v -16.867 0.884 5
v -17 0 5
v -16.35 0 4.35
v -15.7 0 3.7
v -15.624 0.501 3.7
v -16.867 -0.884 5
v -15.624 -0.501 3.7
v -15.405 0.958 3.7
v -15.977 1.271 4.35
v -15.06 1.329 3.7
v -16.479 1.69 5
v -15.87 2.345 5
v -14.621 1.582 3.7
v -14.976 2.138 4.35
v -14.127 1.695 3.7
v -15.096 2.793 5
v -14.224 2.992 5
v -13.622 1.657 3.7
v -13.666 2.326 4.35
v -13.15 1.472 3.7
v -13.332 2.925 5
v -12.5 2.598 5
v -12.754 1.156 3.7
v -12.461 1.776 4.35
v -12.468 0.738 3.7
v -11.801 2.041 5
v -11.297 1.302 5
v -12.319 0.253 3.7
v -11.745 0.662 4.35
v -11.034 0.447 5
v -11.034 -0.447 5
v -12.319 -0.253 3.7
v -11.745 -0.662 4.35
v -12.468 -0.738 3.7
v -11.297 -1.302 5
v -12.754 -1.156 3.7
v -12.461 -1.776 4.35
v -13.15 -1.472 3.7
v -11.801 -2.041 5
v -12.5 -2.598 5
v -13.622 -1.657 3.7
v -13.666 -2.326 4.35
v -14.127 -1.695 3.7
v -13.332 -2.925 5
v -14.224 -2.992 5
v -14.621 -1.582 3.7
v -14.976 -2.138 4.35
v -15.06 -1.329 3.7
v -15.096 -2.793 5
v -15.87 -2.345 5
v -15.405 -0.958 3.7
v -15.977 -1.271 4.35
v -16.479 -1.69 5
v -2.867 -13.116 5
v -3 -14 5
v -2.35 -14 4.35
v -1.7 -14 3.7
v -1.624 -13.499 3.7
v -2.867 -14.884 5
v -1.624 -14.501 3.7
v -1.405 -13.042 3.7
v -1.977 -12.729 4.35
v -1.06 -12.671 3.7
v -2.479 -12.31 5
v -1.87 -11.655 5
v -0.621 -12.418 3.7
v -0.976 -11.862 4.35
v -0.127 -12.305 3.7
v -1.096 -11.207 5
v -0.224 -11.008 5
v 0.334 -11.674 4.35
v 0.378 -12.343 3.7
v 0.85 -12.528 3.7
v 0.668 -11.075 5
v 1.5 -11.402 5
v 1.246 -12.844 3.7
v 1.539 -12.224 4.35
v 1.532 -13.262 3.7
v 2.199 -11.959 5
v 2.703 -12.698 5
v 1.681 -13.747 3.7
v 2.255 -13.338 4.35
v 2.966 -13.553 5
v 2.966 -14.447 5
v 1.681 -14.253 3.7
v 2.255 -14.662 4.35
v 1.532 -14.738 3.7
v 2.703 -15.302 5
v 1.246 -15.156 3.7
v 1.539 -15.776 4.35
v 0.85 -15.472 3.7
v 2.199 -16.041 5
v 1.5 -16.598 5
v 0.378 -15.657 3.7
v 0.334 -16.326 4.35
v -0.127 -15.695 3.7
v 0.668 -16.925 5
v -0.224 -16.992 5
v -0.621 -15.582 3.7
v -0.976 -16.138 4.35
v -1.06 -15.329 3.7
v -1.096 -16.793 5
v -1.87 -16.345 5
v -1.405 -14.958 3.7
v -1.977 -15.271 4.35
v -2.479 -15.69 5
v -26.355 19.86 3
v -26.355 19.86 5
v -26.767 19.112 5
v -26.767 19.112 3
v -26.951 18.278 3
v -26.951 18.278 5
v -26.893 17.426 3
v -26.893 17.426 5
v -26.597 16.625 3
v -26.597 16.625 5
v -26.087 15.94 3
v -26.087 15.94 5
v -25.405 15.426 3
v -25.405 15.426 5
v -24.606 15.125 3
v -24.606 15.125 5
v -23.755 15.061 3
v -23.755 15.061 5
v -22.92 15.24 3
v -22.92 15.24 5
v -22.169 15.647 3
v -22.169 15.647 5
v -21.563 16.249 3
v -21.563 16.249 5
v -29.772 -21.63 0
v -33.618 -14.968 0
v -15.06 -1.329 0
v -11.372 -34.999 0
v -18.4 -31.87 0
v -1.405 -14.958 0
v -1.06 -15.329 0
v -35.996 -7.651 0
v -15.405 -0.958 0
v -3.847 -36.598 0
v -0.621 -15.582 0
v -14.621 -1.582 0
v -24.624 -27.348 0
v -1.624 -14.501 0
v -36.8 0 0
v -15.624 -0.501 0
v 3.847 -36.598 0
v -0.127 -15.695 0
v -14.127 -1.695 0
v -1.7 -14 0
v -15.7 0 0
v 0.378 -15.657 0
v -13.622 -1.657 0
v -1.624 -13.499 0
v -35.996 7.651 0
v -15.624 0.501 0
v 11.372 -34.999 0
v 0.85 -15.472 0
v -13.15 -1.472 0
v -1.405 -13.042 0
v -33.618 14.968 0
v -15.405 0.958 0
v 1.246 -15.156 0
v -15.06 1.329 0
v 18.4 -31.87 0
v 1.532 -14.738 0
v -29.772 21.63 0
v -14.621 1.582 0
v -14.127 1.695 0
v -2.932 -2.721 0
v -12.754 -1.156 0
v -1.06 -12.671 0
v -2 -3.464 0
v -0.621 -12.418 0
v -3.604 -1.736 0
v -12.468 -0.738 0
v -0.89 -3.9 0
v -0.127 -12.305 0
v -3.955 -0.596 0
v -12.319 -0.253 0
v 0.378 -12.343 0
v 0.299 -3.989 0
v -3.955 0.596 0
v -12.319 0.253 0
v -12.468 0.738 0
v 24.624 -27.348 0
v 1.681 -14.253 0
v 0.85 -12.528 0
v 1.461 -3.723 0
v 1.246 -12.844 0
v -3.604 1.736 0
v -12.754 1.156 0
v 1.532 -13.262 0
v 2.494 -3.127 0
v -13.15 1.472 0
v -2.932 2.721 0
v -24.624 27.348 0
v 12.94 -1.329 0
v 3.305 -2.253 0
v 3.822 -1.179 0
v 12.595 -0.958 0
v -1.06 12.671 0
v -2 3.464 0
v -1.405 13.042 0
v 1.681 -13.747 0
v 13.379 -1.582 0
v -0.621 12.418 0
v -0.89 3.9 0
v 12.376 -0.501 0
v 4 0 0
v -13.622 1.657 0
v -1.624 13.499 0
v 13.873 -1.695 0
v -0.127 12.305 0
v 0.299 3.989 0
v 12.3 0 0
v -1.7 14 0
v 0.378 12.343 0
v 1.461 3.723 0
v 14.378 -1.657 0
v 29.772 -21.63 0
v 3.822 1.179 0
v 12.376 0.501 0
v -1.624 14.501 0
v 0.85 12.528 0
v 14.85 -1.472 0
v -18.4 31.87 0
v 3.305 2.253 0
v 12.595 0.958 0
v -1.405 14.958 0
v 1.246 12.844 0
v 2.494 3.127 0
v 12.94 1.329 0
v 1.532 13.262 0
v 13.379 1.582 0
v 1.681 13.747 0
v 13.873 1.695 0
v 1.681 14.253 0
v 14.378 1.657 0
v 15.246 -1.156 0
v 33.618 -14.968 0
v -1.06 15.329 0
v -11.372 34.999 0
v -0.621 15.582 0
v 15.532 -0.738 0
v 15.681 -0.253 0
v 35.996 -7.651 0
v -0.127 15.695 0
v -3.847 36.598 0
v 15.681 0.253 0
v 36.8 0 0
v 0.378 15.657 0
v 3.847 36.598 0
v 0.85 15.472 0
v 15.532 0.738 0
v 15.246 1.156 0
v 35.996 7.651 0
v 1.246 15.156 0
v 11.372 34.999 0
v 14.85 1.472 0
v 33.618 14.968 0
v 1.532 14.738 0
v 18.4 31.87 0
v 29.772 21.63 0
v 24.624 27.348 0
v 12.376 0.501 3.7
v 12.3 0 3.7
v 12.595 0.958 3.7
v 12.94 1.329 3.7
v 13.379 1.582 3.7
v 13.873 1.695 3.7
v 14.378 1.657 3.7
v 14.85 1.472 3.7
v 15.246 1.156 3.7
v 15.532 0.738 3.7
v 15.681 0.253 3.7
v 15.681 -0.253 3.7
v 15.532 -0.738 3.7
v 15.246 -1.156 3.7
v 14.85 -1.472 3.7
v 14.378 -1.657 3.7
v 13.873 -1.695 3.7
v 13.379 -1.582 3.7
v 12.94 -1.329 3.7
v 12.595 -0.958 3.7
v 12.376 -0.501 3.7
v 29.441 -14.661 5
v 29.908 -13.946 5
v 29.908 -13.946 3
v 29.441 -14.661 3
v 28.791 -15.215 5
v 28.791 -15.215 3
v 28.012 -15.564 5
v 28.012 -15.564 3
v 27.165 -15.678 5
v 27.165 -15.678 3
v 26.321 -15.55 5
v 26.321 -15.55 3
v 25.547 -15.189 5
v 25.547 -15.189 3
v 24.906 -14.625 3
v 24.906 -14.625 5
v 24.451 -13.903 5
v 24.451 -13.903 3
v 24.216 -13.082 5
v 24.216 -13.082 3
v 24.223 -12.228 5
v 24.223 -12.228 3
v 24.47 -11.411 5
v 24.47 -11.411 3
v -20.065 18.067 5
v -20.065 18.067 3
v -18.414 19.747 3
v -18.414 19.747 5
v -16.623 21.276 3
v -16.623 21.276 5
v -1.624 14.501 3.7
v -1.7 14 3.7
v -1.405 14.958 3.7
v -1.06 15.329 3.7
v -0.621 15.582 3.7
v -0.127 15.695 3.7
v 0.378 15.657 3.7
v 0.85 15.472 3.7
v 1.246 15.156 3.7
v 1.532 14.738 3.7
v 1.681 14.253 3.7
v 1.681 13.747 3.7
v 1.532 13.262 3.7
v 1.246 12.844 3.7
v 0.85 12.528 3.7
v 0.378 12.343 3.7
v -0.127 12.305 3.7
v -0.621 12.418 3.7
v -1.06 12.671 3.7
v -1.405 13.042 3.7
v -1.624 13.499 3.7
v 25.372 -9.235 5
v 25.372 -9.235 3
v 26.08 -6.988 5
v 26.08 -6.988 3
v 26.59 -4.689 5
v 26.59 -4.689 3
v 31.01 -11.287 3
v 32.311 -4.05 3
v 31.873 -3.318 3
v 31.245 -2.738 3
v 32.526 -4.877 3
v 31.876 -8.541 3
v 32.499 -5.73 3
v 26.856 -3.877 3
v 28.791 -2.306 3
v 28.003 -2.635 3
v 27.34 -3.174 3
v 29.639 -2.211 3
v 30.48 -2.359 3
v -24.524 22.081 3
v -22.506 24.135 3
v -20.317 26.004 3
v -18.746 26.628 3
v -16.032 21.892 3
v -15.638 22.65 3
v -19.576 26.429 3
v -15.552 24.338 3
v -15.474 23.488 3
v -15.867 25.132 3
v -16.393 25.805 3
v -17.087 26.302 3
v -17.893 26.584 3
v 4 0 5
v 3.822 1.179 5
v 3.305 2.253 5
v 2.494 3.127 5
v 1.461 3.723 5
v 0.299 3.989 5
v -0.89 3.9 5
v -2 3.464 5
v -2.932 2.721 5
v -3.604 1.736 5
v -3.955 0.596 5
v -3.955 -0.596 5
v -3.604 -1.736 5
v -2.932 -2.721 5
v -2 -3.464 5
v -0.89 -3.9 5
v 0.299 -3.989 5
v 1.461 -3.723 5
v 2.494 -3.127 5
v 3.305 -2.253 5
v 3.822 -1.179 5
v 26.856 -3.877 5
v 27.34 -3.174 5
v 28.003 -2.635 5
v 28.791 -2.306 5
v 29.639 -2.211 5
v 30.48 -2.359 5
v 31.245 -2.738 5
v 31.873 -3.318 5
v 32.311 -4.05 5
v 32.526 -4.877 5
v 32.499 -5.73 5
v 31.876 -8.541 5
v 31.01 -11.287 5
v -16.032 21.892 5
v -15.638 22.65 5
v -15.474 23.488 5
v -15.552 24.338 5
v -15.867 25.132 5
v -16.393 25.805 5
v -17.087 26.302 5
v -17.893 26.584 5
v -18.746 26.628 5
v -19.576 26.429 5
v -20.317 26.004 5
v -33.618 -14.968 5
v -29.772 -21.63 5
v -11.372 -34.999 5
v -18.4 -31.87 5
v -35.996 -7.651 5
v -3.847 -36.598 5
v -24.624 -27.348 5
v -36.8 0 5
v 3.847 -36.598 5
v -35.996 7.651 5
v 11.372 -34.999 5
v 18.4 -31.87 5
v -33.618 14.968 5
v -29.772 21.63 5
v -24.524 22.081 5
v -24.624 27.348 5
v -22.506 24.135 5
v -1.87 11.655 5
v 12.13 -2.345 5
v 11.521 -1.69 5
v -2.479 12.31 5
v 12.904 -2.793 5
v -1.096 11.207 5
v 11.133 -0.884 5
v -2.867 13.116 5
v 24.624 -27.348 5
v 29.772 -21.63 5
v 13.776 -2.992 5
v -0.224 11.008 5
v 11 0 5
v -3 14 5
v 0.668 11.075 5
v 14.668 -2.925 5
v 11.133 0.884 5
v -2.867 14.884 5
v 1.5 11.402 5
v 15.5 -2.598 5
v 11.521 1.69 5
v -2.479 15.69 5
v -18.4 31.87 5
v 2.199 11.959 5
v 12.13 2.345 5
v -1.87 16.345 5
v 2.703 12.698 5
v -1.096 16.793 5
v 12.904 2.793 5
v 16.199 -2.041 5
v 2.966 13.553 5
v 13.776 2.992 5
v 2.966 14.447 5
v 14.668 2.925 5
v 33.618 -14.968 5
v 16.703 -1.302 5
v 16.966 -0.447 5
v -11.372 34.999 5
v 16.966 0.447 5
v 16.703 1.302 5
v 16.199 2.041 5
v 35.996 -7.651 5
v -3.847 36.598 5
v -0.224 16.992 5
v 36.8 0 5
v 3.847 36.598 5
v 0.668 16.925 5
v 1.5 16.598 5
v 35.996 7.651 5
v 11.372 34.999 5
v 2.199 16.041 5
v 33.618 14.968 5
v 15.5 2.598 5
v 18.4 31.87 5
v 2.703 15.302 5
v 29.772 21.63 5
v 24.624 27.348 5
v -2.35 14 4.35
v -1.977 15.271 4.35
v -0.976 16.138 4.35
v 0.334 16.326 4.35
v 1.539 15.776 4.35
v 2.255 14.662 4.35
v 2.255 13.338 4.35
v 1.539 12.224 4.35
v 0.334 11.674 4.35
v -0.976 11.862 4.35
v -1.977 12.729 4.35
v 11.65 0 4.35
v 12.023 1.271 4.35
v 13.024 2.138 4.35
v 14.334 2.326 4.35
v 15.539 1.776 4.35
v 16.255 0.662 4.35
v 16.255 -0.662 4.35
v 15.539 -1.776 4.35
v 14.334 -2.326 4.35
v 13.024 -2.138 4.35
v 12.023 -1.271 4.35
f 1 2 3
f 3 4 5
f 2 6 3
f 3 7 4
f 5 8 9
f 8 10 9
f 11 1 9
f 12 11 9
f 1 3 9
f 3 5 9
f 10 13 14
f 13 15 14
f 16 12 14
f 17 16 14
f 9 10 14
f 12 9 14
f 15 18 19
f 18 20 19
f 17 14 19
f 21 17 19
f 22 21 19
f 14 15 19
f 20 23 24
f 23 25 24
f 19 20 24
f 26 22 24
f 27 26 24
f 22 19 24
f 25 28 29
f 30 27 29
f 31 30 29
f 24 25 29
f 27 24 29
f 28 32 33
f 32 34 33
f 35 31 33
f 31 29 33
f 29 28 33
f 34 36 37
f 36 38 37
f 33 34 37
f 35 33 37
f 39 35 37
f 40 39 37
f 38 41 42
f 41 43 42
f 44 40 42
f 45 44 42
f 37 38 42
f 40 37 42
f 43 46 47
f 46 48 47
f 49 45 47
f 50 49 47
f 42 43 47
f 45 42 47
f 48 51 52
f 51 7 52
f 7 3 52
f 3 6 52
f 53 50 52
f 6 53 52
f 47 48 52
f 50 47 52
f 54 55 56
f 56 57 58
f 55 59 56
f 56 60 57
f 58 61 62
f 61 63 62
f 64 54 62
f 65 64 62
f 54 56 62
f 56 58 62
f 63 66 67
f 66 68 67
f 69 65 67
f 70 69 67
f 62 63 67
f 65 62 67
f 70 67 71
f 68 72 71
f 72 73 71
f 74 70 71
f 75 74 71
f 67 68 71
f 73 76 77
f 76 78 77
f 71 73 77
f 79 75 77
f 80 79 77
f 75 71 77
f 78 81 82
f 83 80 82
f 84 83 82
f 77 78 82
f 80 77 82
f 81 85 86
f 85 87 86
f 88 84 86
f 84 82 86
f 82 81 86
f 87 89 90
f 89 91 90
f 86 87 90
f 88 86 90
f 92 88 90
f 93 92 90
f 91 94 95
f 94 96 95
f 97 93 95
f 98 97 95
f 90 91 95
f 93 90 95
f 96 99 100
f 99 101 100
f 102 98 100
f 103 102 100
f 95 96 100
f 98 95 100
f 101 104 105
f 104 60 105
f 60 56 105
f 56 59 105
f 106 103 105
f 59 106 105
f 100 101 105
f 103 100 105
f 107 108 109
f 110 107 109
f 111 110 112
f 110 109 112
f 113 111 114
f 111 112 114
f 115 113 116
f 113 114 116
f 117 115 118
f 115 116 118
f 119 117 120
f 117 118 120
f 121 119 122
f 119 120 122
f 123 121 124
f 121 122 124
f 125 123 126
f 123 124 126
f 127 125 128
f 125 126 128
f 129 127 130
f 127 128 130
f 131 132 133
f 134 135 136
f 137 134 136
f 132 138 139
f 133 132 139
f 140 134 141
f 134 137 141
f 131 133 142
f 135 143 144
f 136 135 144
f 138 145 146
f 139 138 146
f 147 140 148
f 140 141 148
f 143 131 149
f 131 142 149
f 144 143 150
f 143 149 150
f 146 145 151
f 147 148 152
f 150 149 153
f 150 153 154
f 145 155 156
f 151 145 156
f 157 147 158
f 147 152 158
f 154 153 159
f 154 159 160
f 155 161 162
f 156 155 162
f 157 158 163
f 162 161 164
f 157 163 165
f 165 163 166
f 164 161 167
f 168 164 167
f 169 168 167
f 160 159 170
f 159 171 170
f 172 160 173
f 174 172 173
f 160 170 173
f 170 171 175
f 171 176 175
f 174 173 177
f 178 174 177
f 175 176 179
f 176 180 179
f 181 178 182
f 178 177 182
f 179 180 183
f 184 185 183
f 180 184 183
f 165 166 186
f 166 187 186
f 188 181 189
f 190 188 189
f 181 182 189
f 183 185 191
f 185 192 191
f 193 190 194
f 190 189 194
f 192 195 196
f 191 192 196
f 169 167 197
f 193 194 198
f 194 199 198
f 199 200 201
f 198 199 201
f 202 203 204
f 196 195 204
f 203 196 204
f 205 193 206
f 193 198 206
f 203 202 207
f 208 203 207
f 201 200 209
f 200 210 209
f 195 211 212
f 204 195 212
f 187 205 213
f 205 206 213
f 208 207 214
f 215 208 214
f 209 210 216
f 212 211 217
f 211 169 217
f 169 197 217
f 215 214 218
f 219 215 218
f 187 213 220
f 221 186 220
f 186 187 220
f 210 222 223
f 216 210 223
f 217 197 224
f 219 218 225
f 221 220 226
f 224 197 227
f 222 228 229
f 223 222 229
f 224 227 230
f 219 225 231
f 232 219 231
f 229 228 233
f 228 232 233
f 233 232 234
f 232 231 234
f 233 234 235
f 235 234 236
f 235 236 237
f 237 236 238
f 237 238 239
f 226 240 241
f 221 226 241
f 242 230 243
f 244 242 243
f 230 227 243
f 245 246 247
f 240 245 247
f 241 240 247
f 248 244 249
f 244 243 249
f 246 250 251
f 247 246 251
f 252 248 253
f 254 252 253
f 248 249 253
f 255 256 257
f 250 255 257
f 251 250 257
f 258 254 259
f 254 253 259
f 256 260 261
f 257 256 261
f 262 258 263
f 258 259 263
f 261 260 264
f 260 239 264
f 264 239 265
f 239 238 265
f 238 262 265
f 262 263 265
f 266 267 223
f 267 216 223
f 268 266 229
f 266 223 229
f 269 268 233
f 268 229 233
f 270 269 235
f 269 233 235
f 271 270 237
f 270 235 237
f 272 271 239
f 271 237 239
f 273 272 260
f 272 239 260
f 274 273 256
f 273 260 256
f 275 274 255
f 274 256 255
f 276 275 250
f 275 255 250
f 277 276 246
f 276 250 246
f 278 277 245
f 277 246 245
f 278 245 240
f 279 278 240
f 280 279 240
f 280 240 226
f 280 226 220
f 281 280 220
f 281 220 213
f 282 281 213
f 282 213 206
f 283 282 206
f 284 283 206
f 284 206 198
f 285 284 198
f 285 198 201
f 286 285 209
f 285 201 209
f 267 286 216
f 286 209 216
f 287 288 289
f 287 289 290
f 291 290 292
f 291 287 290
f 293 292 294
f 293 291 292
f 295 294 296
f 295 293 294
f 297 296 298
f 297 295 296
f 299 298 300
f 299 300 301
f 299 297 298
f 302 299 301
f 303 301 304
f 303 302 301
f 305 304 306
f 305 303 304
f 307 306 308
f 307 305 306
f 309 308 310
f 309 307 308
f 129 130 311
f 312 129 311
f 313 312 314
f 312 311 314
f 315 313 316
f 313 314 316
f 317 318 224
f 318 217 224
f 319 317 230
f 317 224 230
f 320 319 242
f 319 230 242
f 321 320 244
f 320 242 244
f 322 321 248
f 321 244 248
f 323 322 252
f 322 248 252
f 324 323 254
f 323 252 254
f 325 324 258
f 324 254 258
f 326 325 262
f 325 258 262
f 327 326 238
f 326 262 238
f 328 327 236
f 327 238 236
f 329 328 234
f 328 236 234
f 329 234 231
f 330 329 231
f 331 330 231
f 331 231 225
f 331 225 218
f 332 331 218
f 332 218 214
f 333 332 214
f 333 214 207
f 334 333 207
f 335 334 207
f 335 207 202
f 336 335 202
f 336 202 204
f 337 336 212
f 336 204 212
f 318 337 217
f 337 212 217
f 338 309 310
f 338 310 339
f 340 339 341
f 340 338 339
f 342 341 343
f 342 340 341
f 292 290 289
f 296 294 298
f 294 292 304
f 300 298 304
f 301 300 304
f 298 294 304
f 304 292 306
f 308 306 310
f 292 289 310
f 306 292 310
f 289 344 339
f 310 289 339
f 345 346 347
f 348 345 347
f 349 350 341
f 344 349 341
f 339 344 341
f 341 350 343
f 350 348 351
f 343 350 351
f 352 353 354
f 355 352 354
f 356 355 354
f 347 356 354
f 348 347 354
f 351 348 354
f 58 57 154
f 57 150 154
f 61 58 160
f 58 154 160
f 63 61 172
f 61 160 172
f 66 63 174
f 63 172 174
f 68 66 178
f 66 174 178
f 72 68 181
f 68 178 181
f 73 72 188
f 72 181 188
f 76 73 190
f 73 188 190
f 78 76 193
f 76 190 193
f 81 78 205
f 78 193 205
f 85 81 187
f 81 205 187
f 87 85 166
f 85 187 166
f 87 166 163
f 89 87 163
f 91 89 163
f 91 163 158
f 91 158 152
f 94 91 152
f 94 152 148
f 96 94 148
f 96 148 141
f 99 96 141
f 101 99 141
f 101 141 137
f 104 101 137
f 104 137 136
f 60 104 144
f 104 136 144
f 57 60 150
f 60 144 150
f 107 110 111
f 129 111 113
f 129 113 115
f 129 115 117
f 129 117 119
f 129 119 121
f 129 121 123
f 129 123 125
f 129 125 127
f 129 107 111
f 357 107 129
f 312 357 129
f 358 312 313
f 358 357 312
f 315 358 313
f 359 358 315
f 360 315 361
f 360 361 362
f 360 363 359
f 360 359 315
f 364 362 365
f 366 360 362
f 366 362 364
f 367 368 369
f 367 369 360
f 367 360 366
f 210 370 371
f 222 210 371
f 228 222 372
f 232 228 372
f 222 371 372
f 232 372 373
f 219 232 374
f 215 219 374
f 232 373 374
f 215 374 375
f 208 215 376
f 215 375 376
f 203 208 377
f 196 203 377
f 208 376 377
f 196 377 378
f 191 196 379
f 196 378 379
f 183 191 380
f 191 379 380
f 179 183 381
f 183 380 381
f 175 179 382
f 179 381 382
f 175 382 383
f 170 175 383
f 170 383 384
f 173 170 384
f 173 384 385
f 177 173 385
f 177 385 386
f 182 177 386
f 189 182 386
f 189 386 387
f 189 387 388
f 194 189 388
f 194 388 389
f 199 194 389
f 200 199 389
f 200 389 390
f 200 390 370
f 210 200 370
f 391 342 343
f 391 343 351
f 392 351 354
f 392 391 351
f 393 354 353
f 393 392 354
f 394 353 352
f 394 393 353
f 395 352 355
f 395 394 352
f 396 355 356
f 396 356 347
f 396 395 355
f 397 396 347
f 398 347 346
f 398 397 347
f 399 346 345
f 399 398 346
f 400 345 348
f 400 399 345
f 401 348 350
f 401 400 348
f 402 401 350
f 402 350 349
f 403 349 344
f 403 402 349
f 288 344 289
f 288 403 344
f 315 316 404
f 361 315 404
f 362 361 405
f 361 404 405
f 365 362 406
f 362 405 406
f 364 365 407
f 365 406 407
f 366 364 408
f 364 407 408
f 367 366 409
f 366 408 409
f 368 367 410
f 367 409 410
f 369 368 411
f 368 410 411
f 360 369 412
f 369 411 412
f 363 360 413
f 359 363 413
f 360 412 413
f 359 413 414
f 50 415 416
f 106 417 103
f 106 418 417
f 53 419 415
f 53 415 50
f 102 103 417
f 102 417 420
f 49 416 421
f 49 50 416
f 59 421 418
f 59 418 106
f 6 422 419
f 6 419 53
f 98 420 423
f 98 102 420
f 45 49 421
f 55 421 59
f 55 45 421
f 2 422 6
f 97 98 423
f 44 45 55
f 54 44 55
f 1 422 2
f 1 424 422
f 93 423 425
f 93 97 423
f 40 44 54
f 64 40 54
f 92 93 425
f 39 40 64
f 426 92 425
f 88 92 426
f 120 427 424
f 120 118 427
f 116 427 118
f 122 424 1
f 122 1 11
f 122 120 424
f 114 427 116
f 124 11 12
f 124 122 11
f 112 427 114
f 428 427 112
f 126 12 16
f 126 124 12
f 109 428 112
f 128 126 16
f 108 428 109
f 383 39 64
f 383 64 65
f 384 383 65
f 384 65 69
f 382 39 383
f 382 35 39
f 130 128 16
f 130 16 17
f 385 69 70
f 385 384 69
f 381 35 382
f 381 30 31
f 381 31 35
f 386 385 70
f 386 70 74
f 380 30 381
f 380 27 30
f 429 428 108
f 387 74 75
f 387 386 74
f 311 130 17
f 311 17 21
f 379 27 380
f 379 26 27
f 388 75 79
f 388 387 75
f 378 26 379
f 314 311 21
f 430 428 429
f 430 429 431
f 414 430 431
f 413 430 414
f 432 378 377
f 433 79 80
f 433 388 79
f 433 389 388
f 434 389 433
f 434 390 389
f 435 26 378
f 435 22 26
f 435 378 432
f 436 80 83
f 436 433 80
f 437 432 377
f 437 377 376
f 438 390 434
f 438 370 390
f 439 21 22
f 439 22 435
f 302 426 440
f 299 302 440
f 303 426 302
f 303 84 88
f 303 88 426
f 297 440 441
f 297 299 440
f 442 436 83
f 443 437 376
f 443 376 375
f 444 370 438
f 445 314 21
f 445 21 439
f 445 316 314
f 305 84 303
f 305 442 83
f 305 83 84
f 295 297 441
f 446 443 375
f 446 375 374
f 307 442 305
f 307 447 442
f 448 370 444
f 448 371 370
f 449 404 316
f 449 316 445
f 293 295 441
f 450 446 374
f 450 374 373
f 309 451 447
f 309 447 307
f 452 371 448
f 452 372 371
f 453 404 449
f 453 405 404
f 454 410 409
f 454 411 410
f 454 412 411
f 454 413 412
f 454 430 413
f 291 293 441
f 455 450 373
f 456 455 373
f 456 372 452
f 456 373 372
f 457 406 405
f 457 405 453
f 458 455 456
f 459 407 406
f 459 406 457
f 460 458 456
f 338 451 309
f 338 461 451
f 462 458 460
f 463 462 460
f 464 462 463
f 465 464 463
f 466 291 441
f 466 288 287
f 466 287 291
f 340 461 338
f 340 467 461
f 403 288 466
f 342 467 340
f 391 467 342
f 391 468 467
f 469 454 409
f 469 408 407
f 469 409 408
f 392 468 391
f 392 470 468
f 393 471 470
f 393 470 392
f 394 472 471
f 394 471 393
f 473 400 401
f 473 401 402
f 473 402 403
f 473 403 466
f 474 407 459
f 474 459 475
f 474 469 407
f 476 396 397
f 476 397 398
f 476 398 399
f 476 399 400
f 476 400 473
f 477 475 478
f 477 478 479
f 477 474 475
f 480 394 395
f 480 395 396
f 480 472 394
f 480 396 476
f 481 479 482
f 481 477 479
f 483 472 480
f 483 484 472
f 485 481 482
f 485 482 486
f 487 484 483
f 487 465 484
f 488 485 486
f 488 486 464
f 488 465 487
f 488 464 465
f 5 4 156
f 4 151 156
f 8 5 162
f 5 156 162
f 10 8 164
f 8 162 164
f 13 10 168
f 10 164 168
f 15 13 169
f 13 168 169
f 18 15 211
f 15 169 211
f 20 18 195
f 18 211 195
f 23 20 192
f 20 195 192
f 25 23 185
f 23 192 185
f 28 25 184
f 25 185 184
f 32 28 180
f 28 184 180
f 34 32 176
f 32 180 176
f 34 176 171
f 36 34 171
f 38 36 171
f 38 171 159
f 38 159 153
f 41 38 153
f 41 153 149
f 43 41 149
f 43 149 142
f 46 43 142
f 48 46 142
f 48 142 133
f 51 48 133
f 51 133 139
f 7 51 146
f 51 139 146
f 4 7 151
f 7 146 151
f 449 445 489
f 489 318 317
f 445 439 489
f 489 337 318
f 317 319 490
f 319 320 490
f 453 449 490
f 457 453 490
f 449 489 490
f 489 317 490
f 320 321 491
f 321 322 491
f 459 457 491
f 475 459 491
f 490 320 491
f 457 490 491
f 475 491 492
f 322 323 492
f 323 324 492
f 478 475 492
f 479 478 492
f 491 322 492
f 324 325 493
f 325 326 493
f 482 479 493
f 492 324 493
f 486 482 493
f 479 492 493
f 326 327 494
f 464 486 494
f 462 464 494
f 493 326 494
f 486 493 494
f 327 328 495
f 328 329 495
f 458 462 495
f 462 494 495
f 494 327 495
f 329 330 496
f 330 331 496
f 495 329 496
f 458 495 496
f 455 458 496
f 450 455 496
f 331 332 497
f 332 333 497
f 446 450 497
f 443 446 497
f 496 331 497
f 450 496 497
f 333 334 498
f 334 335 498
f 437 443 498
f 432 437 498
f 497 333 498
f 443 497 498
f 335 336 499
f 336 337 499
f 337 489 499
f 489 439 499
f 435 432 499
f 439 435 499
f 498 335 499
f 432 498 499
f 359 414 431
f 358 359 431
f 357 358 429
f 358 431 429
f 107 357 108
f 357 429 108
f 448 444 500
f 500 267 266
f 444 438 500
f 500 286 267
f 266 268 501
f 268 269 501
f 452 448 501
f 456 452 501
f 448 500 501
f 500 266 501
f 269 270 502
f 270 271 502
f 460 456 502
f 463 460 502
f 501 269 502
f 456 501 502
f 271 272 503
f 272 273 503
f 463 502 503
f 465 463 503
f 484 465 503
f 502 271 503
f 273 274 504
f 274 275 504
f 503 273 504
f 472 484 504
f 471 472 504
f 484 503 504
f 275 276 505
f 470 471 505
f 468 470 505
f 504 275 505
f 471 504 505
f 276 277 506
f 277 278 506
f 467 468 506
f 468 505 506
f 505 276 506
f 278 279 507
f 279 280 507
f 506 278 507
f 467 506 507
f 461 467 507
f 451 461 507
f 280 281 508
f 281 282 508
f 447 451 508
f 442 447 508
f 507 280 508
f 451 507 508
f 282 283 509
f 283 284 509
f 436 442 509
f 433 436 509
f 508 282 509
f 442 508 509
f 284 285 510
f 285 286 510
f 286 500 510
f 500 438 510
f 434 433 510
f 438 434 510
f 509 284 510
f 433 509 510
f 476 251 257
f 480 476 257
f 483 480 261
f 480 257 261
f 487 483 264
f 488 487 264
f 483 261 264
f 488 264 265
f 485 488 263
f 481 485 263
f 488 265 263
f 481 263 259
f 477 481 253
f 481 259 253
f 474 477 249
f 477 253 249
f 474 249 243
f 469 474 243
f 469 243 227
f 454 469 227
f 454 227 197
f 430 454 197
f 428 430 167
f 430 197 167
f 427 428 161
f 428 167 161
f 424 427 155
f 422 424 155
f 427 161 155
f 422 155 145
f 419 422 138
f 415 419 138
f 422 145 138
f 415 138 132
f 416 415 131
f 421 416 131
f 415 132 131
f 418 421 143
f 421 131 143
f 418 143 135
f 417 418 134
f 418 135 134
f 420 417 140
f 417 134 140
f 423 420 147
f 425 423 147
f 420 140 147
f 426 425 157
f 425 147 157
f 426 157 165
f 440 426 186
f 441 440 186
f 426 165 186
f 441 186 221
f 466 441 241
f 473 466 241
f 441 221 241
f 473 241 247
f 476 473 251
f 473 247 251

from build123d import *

# Parameters (mm, degrees)
SKETCH1_R                                           = 36.8
BOSS_EXTRUDE1_DEPTH                                 = 5
CUT_EXTRUDE1_REACH                                  = 54.283
SKETCH2_R                                           = 4
CUT_EXTRUDE2_DEPTH                                  = 2
CUT_EXTRUDE3_DEPTH                                  = 2
CSK_FOR_M3_FLAT_COUNTERSUNK_HEAD_SCREW1_D           = 3.4
CSK_FOR_M3_FLAT_COUNTERSUNK_HEAD_SCREW1_DEPTH       = 9
CSK_FOR_M3_FLAT_COUNTERSUNK_HEAD_SCREW1_CSINK_D     = 6
CSK_FOR_M3_FLAT_COUNTERSUNK_HEAD_SCREW1_CSINK_ANGLE = 90
CSK_FOR_M3_FLAT_COUNTERSUNK_HEAD_SCREW1_TIP         = 1.021463052


with BuildPart() as part:
    # Sketch1 → Boss-Extrude1 (new body)
    with BuildSketch(Plane.XY):
        Circle(SKETCH1_R)
    extrude(amount=BOSS_EXTRUDE1_DEPTH)

    # Sketch2 → Cut-Extrude1 (cut, up to next)
    with BuildSketch(Plane.XY.offset(5), mode=Mode.PRIVATE) as cut_extrude1_sk1:
        Circle(SKETCH2_R)
    cut_extrude1_tool1 = extrude(cut_extrude1_sk1.sketch, amount=-CUT_EXTRUDE1_REACH, mode=Mode.PRIVATE) & part.part
    add(cut_extrude1_tool1.solids().sort_by_distance((0, 0, 5))[0], mode=Mode.SUBTRACT)

    # Sketch3 → Cut-Extrude2 (cut)
    with BuildSketch(Plane.XY.offset(5)):
        with BuildLine():
            ThreePointArc((24.47031025, -11.410693067), (25.75035767, -8.119056587), (26.589809331, -4.688500797))
            ThreePointArc((26.589809331, -4.688500797), (30.065177123, -2.255022071), (32.498655849, -5.730389863))
            ThreePointArc((32.498655849, -5.730389863), (31.472659375, -9.923291384), (29.908156972, -13.946402637))
            ThreePointArc((29.908156972, -13.946402637), (25.921378826, -15.397471213), (24.47031025, -11.410693067))
        make_face()
    extrude(amount=-CUT_EXTRUDE2_DEPTH, mode=Mode.SUBTRACT)

    # Sketch4 → Cut-Extrude3 (cut)
    with BuildSketch(Plane.XY.offset(5)):
        with BuildLine():
            ThreePointArc((-20.316828686, 26.004354869), (-23.537264822, 23.130005722), (-26.354971832, 19.859895764))
            ThreePointArc((-26.354971832, 19.859895764), (-25.764510371, 15.658544164), (-21.563158771, 16.249005625))
            ThreePointArc((-21.563158771, 16.249005625), (-19.257762127, 18.924550136), (-16.622859834, 21.276290347))
            ThreePointArc((-16.622859834, 21.276290347), (-16.105811999, 25.487307034), (-20.316828686, 26.004354869))
        make_face()
    extrude(amount=-CUT_EXTRUDE3_DEPTH, mode=Mode.SUBTRACT)

    # CSK for M3 Flat Countersunk Head Screw1
    with Locations(Plane.XY.offset(5)):
        with Locations((0, 14), (14, 0), (0, -14), (-14, 0)):
            CounterSinkHole(CSK_FOR_M3_FLAT_COUNTERSUNK_HEAD_SCREW1_D / 2, CSK_FOR_M3_FLAT_COUNTERSUNK_HEAD_SCREW1_CSINK_D / 2, depth=CSK_FOR_M3_FLAT_COUNTERSUNK_HEAD_SCREW1_DEPTH, counter_sink_angle=CSK_FOR_M3_FLAT_COUNTERSUNK_HEAD_SCREW1_CSINK_ANGLE)
            with Locations((0, 0, -(CSK_FOR_M3_FLAT_COUNTERSUNK_HEAD_SCREW1_DEPTH + CSK_FOR_M3_FLAT_COUNTERSUNK_HEAD_SCREW1_TIP / 2))):  # 118° drill point
                Cone(0, CSK_FOR_M3_FLAT_COUNTERSUNK_HEAD_SCREW1_D / 2, CSK_FOR_M3_FLAT_COUNTERSUNK_HEAD_SCREW1_TIP, mode=Mode.SUBTRACT)


solid = part.part
